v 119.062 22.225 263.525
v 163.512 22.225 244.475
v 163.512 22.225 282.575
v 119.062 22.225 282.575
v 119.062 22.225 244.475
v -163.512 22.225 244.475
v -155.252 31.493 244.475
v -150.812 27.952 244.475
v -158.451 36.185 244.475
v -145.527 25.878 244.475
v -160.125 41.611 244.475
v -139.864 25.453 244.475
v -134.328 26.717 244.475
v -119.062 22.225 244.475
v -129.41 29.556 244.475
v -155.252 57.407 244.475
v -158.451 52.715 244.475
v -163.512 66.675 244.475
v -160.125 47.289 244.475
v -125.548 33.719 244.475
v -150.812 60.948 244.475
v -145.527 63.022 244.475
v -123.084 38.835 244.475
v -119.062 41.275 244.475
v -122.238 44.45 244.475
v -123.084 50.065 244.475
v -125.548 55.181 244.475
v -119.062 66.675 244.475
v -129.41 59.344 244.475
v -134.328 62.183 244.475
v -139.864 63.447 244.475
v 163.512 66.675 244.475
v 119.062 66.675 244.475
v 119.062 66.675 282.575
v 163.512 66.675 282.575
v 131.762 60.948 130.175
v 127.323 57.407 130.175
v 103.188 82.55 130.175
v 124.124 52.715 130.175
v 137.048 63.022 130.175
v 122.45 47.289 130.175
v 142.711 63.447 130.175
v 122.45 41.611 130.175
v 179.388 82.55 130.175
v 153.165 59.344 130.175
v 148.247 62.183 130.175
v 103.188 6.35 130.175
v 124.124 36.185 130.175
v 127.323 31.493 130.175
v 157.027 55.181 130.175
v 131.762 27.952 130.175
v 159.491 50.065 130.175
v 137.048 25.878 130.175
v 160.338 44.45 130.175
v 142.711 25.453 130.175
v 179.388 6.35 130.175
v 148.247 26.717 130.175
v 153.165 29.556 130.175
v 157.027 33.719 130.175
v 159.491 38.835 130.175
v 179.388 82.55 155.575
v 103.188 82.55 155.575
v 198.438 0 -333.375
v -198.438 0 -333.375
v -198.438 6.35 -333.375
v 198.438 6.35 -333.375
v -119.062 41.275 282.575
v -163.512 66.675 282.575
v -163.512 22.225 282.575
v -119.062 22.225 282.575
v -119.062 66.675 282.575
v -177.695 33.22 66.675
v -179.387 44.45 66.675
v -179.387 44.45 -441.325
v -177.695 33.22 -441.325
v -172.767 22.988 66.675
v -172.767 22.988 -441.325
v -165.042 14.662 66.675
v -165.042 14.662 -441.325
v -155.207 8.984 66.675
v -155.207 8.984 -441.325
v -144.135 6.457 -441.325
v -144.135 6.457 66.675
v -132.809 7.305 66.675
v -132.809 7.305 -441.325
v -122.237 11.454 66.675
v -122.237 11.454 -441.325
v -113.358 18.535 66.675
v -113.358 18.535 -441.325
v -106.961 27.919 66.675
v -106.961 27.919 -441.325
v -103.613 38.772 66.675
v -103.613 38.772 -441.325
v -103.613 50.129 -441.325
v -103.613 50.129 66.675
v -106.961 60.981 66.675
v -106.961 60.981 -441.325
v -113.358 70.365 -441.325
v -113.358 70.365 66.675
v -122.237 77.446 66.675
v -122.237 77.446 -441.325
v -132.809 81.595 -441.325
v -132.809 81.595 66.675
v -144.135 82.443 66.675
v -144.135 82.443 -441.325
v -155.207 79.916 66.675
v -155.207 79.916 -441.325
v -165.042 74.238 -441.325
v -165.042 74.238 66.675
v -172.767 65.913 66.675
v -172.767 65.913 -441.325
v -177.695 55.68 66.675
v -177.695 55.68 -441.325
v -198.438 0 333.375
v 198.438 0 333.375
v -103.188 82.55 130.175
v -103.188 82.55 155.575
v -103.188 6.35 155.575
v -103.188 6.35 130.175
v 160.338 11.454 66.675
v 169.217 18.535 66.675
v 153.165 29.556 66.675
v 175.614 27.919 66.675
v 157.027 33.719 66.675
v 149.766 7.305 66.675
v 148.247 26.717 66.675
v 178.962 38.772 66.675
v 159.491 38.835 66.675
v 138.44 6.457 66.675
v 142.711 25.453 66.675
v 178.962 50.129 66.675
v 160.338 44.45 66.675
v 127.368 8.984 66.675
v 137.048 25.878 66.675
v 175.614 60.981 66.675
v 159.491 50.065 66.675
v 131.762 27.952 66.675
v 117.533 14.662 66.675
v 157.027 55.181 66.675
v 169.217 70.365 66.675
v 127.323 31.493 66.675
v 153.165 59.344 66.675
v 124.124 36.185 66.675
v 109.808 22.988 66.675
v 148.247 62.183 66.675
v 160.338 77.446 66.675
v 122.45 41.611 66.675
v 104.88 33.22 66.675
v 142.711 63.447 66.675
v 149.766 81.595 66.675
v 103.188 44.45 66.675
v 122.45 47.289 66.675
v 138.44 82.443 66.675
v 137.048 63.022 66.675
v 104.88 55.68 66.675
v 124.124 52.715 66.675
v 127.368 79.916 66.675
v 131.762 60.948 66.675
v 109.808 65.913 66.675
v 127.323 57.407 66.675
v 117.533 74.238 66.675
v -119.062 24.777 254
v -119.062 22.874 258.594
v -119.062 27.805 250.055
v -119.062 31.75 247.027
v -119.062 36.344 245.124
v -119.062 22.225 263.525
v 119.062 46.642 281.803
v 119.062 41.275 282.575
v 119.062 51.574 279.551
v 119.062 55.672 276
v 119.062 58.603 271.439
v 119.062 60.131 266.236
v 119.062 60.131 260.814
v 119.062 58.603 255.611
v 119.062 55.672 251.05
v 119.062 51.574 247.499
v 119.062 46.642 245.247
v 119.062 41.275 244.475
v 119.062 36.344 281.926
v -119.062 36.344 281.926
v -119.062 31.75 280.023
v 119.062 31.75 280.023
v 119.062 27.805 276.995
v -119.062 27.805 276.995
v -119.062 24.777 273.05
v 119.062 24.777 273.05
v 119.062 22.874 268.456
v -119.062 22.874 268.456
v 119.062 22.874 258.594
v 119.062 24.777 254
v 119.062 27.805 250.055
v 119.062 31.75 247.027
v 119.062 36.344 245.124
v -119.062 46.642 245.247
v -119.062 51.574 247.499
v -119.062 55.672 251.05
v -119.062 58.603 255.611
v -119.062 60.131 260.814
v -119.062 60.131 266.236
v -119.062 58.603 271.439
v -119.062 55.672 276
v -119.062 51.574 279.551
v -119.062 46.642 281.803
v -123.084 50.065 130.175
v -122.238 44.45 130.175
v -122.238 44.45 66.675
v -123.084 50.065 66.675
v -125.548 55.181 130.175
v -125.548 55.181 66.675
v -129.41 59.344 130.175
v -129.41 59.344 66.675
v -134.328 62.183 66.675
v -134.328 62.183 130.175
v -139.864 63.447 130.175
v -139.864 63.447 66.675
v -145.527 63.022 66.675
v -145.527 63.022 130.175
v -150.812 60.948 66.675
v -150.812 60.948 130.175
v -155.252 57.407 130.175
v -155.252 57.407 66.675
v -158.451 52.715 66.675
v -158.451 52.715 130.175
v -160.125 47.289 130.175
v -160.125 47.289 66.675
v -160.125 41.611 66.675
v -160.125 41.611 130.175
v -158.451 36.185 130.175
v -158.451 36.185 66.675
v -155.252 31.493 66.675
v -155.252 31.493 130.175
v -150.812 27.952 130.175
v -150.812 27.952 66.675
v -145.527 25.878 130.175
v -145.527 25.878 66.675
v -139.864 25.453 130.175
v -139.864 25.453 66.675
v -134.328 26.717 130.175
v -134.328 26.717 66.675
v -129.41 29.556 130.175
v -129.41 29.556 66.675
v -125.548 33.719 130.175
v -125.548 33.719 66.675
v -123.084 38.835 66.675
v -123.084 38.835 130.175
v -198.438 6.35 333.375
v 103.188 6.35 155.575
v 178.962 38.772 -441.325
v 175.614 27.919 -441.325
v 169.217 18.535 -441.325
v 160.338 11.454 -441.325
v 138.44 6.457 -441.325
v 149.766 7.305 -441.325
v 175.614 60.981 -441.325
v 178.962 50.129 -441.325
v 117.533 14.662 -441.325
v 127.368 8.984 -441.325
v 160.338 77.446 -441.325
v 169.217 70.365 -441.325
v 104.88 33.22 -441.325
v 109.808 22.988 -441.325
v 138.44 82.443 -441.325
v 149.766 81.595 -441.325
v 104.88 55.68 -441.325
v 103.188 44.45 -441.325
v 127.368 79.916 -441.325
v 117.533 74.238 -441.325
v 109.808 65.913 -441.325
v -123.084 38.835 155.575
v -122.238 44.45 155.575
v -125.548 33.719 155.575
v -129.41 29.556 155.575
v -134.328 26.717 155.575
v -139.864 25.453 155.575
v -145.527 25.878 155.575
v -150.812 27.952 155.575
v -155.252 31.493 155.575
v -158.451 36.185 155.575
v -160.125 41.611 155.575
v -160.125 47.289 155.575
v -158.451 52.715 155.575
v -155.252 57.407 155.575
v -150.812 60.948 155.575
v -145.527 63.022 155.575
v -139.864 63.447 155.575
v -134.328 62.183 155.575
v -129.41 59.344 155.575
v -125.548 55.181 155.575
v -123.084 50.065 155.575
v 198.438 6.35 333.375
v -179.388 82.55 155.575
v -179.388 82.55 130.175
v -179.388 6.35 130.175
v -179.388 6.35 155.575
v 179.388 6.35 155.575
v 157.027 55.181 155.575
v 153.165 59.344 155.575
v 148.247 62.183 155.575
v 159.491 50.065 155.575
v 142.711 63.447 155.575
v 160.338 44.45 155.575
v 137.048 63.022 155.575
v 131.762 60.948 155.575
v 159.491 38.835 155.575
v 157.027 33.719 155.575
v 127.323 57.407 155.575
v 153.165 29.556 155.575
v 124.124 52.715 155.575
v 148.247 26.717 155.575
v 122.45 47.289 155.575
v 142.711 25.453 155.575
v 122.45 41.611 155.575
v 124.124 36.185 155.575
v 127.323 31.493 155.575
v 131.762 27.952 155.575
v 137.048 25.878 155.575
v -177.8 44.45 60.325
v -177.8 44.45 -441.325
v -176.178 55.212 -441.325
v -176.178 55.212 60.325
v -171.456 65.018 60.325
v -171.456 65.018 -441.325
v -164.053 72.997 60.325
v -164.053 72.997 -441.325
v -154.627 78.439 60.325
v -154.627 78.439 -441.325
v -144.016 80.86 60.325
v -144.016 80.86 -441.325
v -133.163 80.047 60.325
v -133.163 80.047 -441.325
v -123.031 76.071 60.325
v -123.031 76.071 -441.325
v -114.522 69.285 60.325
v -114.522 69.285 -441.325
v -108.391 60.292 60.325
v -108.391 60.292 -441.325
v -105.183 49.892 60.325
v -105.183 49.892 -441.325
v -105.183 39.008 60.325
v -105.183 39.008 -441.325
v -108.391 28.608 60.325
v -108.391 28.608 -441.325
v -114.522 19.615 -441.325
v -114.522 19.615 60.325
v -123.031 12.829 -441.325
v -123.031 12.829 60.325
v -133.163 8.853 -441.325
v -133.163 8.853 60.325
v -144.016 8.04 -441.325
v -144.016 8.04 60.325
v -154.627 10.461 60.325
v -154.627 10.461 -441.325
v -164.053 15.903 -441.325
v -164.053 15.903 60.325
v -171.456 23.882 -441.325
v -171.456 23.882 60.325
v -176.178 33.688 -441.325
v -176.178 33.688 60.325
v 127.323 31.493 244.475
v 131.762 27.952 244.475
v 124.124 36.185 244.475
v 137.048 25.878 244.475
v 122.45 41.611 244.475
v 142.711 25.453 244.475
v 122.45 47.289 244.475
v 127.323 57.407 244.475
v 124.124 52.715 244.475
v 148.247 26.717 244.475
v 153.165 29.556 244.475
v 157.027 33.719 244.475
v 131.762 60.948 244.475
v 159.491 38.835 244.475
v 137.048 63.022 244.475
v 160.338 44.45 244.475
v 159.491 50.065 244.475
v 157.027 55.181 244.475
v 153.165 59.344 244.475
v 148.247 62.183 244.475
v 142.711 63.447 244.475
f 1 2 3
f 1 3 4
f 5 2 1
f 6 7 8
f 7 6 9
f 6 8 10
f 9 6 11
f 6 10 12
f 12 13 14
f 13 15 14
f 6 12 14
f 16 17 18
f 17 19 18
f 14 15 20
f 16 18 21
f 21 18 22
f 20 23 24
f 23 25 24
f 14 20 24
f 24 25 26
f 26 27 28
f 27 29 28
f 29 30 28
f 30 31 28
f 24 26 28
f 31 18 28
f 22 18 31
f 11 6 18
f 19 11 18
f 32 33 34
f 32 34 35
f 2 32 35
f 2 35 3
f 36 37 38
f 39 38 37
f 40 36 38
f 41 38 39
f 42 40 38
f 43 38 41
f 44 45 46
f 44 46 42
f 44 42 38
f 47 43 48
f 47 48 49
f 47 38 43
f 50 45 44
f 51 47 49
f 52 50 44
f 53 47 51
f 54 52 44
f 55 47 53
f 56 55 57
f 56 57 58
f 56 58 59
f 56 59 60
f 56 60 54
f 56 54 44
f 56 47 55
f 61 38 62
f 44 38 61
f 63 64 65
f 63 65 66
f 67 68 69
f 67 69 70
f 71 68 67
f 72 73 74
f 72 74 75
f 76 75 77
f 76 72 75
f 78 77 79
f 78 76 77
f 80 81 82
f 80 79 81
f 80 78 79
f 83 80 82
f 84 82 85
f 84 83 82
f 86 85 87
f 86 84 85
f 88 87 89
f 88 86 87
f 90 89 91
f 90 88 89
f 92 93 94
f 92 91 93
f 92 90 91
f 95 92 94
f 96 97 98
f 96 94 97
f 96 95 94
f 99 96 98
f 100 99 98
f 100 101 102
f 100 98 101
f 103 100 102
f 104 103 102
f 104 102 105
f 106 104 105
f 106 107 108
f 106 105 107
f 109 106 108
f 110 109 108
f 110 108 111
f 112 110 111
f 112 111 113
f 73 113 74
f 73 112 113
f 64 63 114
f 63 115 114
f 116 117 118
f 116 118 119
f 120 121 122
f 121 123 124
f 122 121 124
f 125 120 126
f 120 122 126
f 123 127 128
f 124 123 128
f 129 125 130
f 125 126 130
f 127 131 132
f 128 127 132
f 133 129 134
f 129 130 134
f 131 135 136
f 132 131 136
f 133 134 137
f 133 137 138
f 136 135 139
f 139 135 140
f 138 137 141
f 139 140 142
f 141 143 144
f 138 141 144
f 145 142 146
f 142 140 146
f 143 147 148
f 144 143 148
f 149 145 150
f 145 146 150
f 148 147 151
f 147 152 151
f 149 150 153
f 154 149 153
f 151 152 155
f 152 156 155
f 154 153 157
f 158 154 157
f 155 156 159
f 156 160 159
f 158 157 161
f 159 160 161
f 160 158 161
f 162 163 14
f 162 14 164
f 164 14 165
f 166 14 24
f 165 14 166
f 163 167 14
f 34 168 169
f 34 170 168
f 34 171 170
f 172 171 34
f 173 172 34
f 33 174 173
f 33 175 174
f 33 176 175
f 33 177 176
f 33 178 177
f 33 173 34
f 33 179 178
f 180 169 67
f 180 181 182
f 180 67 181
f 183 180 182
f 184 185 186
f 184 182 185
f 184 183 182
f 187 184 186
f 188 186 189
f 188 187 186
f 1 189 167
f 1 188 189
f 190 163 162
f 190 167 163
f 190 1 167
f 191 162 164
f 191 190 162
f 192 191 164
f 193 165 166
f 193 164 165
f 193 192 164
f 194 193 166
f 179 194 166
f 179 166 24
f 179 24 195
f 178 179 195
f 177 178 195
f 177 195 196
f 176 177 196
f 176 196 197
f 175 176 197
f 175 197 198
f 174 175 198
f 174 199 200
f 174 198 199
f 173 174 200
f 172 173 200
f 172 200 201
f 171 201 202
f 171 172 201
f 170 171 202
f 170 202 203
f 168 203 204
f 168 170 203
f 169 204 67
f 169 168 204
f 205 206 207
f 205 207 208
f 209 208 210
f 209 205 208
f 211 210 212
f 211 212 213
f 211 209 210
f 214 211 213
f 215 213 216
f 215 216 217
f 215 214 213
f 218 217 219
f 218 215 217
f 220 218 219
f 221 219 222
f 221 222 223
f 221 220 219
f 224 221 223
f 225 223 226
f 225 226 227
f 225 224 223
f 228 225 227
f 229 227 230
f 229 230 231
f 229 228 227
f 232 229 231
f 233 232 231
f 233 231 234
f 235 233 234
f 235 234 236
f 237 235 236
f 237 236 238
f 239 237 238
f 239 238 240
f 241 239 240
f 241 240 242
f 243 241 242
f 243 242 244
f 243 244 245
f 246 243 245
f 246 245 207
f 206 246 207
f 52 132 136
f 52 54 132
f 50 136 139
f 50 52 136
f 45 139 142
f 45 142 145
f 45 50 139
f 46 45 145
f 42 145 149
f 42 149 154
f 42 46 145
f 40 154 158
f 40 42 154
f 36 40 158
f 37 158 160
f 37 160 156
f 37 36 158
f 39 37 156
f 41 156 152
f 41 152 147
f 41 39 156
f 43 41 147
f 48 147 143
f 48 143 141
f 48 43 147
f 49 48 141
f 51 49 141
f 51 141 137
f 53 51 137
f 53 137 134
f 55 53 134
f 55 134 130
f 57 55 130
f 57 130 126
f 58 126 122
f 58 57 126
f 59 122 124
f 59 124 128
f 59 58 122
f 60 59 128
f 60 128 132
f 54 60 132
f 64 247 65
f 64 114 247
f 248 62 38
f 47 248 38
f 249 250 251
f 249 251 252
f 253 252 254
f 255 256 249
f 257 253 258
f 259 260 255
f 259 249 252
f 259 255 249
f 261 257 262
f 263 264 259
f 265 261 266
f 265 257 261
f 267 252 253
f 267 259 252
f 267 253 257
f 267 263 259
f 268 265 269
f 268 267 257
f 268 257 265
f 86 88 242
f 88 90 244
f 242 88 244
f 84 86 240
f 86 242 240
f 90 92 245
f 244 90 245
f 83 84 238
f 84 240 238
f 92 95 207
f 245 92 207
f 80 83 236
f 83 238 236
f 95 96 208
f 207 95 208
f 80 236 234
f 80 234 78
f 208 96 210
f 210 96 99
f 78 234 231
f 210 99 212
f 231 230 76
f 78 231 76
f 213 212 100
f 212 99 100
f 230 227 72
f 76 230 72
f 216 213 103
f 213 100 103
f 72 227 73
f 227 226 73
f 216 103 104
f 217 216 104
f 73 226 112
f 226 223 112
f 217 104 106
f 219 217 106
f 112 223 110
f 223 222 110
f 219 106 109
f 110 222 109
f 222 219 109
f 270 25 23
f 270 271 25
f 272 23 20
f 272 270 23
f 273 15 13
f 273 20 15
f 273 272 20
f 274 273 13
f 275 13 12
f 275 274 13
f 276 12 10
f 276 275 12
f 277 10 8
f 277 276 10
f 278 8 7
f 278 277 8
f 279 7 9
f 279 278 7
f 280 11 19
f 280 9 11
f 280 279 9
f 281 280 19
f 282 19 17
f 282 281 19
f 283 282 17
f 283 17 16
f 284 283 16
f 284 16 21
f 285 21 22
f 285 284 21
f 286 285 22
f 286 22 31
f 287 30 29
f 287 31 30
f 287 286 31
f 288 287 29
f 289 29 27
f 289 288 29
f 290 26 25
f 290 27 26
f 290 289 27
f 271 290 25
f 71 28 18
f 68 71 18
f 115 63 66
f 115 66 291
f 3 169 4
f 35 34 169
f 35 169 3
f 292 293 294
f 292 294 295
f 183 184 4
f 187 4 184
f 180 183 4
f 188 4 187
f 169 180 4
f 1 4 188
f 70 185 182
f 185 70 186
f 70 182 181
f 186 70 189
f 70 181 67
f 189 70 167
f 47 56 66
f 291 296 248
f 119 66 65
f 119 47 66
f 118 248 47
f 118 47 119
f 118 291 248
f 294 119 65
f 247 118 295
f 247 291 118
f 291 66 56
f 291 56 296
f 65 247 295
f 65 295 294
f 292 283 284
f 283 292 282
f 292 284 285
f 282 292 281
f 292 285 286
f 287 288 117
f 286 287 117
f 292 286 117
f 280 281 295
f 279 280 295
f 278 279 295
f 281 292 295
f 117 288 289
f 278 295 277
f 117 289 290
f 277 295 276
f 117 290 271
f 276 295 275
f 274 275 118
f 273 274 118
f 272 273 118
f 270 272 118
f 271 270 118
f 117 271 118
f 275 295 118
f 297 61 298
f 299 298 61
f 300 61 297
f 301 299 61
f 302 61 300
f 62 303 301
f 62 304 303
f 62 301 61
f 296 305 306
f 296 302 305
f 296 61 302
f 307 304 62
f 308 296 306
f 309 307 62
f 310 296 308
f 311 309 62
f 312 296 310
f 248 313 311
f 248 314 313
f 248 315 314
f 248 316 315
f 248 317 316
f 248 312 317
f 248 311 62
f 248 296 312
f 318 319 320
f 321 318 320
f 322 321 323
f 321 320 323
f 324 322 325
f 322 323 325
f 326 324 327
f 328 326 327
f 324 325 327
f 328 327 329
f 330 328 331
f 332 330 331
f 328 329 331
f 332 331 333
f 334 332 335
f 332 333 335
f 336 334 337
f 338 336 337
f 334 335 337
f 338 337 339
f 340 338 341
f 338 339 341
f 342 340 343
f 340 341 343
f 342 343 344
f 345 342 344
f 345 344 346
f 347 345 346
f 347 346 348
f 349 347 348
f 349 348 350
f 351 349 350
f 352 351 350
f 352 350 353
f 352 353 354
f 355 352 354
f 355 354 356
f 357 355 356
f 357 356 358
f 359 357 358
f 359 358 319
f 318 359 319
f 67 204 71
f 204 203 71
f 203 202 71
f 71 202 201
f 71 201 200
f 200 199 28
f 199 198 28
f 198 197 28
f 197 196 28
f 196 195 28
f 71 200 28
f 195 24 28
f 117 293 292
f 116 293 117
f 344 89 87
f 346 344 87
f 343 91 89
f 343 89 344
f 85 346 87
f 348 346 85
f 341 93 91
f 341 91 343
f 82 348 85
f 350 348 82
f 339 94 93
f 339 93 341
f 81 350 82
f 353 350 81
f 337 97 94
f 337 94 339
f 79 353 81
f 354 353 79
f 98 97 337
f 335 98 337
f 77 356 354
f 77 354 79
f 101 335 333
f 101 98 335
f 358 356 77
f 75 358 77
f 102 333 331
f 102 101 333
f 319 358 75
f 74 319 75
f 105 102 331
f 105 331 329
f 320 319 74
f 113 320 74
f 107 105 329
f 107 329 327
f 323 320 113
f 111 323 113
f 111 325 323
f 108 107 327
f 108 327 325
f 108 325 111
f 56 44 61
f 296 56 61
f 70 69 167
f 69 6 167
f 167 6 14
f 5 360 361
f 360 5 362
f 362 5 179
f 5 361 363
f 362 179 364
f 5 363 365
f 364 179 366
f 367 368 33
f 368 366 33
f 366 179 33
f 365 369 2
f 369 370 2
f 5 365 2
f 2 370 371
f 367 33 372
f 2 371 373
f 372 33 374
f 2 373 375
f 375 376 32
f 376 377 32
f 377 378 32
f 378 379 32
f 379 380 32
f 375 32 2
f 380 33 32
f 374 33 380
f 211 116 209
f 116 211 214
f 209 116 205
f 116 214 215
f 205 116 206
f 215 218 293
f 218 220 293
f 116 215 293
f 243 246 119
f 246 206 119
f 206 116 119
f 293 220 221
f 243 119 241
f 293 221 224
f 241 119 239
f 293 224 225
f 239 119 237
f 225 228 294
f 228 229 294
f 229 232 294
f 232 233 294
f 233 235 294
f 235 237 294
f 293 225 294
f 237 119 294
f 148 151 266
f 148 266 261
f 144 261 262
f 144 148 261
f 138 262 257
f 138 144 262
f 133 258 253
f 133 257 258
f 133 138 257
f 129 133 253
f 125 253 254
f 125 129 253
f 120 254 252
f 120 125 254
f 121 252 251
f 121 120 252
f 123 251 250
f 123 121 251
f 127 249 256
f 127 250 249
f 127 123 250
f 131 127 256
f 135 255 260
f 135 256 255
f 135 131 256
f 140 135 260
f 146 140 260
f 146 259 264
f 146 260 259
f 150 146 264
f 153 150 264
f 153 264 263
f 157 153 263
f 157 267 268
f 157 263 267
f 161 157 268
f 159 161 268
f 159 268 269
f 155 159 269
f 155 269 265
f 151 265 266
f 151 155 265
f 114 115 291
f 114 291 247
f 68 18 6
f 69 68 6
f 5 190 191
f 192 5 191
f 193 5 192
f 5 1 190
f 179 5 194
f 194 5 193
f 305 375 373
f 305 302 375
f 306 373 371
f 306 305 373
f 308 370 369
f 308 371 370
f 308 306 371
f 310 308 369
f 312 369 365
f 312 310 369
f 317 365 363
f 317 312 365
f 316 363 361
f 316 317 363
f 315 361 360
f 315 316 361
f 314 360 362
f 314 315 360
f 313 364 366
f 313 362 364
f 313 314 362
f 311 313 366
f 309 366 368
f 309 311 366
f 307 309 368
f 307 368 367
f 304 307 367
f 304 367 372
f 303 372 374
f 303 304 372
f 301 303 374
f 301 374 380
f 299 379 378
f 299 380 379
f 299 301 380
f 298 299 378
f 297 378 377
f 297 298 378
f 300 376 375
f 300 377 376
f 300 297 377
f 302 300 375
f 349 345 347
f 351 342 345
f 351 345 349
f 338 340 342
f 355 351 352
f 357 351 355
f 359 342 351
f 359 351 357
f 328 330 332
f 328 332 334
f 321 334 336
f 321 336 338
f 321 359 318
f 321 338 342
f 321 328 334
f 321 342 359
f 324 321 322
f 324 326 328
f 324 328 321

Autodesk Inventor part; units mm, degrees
ref_plane "YZ Plane" through (0, 0, 0) normal (1, 0, 0) x (0, 1, 0)
ref_plane "XZ Plane" through (0, 0, 0) normal (0, 1, 0) x (-1, 0, 0)
ref_plane "XY Plane" through (0, 0, 0) normal (0, 0, 1) x (1, 0, 0)
sketch "Sketch1" plane through (0, 0, 0) normal (0, 1, 0) x (-1, 0, 0)
  line L0 (198.4375, 333.375) -> (198.4375, -333.375)
  line L1 (198.4375, -333.375) -> (-198.4375, -333.375)
  line L2 (-198.4375, -333.375) -> (-198.4375, 333.375)
  line L3 (-198.4375, 333.375) -> (198.4375, 333.375)
  line L4 (198.4375, 333.375) -> (-198.4375, -333.375) construction
  line L5 (198.4375, -333.375) -> (-198.4375, 333.375) construction
  point P0 (0, 0)
  dimension "d0" = 666.75
  dimension "d1" = 396.875
extrude "Extrusion1" add sketch "Sketch1" along normal blind 6.35
sketch "Sketch2" plane through (0, 6.35, 0) normal (0, 1, 0) x (1, 0, 0)
  line L0 (179.3875, -155.575) -> (103.1875, -155.575)
  line L1 (103.1875, -155.575) -> (103.1875, -130.175)
  line L2 (103.1875, -130.175) -> (179.3875, -130.175)
  line L3 (179.3875, -130.175) -> (179.3875, -155.575)
  line L4 (198.4375, -333.375) -> (198.4375, 333.375) projected
  line L5 (-179.3875, -155.575) -> (-103.1875, -155.575)
  line L6 (-103.1875, -155.575) -> (-103.1875, -130.175)
  line L7 (-103.1875, -130.175) -> (-179.3875, -130.175)
  line L8 (-179.3875, -130.175) -> (-179.3875, -155.575)
  line L9 (-198.4375, 333.375) -> (-198.4375, -333.375) projected
  line L10 (198.4375, -333.375) -> (-198.4375, -333.375) projected
  point P0 (0, 0)
  dimension "d4" = 76.2
  dimension "d5" = 25.4
  dimension "d6" = 19.05
  dimension "d7" = 76.2
  dimension "d8" = 25.4
  dimension "d9" = 19.05
  dimension "d10" = 177.8
  dimension "d11" = 177.8
extrude "Extrusion2" add sketch "Sketch2" along normal blind 76.2
sketch "Sketch3" plane through (-179.3875, 6.35, 155.575) normal (0, 0, 1) x (1, 0, 0)
  circle A0 centre (38.1, 38.1) radius 19.05
  circle A1 centre (228.6, 38.1) radius 19.05
  point P0 (179.3875, -6.35)
  dimension "d14" = 38.1
  dimension "d15" = 38.1
extrude "Extrusion3" cut sketch "Sketch3" against normal blind 76.2
sketch "Sketch4" plane through (-179.3875, 6.35, 155.575) normal (0, 0, 1) x (1, 0, 0)
  circle A0 centre (38.1, 38.1) radius 19.05 projected
  circle A1 centre (38.1, 38.1) radius 19.05
  circle A2 centre (320.675, 38.1) radius 19.05
  point P0 (179.3875, -6.35)
  dimension "d44" = 38.1
extrude "Extrusion4" add sketch "Sketch4" along normal blind 88.9 and the other way blind 88.9
sketch "Sketch5" plane through (49.2125, 44.45, 66.675) normal (0, 0, -1) x (-1, 0, 0)
  circle A0 centre (190.5, 0) radius 19.05 projected
  circle A1 centre (190.5, 0) radius 38.1
  circle A2 centre (-92.075, 0) radius 19.05 projected
  circle A3 centre (-92.075, 0) radius 38.1
  point P0 (49.2125, -44.45)
  dimension "d23" = 76.2
extrude "Extrusion5" add sketch "Sketch5" along normal blind 508 contours A0 | A1 | A2 | A3
sketch "Sketch6" plane through (-141.2875, 44.45, 244.475) normal (0, 0, 1) x (1, 0, 0)
  line L0 (-22.225, -22.225) -> (22.225, -22.225)
  line L1 (22.225, -22.225) -> (22.225, 22.225)
  line L2 (22.225, 22.225) -> (-22.225, 22.225)
  line L3 (-22.225, 22.225) -> (-22.225, -22.225)
  line L4 (-22.225, -22.225) -> (22.225, 22.225) construction
  line L5 (22.225, -22.225) -> (-22.225, 22.225) construction
  line L6 (304.8, -22.225) -> (260.35, -22.225)
  line L7 (260.35, -22.225) -> (260.35, 22.225)
  line L8 (260.35, 22.225) -> (304.8, 22.225)
  line L9 (304.8, 22.225) -> (304.8, -22.225)
  line L10 (304.8, -22.225) -> (260.35, 22.225) construction
  line L11 (260.35, -22.225) -> (304.8, 22.225) construction
  line L12 (-38.1, -38.1) -> (-38.1, 38.1) projected
  line L13 (-38.1, 38.1) -> (38.1, 38.1) projected
  point P0 (141.2875, -44.45)
  point P1 (0, 0)
  point P2 (282.575, 0)
  dimension "d26" = 44.45
  dimension "d27" = 44.45
  dimension "d28" = 44.45
  dimension "d29" = 44.45
  dimension "d30" = 282.575
  dimension "d31" = 38.1
  dimension "d32" = 38.1
extrude "Extrusion6" add sketch "Sketch6" along normal blind 38.1
sketch "Sketch7" plane through (119.0625, 22.225, 244.475) normal (-1, 0, 0) x (0, 0, 1)
  circle A0 centre (19.05, 19.05) radius 19.05
  line L0 (0, 0) -> (0, 44.45) projected
  line L1 (0, 0) -> (38.1, 0) projected
  point P0 (-244.475, -22.225)
  dimension "d35" = 38.1
  dimension "d36" = 19.05
  dimension "d37" = 19.05
extrude "Extrusion7" add sketch "Sketch7" along normal blind 238.125 contours A0
sketch "Sketch9" plane through (-141.2875, 44.45, -441.325) normal (0, 0, -1) x (-1, 0, 0)
  circle A0 centre (0, 0) radius 36.5125
  point P0 (-141.2875, -44.45)
  dimension "d45" = 73.025
extrude "Extrusion9" cut sketch "Sketch9" against normal blind 501.65
properties part number "Cannon Barrel"
